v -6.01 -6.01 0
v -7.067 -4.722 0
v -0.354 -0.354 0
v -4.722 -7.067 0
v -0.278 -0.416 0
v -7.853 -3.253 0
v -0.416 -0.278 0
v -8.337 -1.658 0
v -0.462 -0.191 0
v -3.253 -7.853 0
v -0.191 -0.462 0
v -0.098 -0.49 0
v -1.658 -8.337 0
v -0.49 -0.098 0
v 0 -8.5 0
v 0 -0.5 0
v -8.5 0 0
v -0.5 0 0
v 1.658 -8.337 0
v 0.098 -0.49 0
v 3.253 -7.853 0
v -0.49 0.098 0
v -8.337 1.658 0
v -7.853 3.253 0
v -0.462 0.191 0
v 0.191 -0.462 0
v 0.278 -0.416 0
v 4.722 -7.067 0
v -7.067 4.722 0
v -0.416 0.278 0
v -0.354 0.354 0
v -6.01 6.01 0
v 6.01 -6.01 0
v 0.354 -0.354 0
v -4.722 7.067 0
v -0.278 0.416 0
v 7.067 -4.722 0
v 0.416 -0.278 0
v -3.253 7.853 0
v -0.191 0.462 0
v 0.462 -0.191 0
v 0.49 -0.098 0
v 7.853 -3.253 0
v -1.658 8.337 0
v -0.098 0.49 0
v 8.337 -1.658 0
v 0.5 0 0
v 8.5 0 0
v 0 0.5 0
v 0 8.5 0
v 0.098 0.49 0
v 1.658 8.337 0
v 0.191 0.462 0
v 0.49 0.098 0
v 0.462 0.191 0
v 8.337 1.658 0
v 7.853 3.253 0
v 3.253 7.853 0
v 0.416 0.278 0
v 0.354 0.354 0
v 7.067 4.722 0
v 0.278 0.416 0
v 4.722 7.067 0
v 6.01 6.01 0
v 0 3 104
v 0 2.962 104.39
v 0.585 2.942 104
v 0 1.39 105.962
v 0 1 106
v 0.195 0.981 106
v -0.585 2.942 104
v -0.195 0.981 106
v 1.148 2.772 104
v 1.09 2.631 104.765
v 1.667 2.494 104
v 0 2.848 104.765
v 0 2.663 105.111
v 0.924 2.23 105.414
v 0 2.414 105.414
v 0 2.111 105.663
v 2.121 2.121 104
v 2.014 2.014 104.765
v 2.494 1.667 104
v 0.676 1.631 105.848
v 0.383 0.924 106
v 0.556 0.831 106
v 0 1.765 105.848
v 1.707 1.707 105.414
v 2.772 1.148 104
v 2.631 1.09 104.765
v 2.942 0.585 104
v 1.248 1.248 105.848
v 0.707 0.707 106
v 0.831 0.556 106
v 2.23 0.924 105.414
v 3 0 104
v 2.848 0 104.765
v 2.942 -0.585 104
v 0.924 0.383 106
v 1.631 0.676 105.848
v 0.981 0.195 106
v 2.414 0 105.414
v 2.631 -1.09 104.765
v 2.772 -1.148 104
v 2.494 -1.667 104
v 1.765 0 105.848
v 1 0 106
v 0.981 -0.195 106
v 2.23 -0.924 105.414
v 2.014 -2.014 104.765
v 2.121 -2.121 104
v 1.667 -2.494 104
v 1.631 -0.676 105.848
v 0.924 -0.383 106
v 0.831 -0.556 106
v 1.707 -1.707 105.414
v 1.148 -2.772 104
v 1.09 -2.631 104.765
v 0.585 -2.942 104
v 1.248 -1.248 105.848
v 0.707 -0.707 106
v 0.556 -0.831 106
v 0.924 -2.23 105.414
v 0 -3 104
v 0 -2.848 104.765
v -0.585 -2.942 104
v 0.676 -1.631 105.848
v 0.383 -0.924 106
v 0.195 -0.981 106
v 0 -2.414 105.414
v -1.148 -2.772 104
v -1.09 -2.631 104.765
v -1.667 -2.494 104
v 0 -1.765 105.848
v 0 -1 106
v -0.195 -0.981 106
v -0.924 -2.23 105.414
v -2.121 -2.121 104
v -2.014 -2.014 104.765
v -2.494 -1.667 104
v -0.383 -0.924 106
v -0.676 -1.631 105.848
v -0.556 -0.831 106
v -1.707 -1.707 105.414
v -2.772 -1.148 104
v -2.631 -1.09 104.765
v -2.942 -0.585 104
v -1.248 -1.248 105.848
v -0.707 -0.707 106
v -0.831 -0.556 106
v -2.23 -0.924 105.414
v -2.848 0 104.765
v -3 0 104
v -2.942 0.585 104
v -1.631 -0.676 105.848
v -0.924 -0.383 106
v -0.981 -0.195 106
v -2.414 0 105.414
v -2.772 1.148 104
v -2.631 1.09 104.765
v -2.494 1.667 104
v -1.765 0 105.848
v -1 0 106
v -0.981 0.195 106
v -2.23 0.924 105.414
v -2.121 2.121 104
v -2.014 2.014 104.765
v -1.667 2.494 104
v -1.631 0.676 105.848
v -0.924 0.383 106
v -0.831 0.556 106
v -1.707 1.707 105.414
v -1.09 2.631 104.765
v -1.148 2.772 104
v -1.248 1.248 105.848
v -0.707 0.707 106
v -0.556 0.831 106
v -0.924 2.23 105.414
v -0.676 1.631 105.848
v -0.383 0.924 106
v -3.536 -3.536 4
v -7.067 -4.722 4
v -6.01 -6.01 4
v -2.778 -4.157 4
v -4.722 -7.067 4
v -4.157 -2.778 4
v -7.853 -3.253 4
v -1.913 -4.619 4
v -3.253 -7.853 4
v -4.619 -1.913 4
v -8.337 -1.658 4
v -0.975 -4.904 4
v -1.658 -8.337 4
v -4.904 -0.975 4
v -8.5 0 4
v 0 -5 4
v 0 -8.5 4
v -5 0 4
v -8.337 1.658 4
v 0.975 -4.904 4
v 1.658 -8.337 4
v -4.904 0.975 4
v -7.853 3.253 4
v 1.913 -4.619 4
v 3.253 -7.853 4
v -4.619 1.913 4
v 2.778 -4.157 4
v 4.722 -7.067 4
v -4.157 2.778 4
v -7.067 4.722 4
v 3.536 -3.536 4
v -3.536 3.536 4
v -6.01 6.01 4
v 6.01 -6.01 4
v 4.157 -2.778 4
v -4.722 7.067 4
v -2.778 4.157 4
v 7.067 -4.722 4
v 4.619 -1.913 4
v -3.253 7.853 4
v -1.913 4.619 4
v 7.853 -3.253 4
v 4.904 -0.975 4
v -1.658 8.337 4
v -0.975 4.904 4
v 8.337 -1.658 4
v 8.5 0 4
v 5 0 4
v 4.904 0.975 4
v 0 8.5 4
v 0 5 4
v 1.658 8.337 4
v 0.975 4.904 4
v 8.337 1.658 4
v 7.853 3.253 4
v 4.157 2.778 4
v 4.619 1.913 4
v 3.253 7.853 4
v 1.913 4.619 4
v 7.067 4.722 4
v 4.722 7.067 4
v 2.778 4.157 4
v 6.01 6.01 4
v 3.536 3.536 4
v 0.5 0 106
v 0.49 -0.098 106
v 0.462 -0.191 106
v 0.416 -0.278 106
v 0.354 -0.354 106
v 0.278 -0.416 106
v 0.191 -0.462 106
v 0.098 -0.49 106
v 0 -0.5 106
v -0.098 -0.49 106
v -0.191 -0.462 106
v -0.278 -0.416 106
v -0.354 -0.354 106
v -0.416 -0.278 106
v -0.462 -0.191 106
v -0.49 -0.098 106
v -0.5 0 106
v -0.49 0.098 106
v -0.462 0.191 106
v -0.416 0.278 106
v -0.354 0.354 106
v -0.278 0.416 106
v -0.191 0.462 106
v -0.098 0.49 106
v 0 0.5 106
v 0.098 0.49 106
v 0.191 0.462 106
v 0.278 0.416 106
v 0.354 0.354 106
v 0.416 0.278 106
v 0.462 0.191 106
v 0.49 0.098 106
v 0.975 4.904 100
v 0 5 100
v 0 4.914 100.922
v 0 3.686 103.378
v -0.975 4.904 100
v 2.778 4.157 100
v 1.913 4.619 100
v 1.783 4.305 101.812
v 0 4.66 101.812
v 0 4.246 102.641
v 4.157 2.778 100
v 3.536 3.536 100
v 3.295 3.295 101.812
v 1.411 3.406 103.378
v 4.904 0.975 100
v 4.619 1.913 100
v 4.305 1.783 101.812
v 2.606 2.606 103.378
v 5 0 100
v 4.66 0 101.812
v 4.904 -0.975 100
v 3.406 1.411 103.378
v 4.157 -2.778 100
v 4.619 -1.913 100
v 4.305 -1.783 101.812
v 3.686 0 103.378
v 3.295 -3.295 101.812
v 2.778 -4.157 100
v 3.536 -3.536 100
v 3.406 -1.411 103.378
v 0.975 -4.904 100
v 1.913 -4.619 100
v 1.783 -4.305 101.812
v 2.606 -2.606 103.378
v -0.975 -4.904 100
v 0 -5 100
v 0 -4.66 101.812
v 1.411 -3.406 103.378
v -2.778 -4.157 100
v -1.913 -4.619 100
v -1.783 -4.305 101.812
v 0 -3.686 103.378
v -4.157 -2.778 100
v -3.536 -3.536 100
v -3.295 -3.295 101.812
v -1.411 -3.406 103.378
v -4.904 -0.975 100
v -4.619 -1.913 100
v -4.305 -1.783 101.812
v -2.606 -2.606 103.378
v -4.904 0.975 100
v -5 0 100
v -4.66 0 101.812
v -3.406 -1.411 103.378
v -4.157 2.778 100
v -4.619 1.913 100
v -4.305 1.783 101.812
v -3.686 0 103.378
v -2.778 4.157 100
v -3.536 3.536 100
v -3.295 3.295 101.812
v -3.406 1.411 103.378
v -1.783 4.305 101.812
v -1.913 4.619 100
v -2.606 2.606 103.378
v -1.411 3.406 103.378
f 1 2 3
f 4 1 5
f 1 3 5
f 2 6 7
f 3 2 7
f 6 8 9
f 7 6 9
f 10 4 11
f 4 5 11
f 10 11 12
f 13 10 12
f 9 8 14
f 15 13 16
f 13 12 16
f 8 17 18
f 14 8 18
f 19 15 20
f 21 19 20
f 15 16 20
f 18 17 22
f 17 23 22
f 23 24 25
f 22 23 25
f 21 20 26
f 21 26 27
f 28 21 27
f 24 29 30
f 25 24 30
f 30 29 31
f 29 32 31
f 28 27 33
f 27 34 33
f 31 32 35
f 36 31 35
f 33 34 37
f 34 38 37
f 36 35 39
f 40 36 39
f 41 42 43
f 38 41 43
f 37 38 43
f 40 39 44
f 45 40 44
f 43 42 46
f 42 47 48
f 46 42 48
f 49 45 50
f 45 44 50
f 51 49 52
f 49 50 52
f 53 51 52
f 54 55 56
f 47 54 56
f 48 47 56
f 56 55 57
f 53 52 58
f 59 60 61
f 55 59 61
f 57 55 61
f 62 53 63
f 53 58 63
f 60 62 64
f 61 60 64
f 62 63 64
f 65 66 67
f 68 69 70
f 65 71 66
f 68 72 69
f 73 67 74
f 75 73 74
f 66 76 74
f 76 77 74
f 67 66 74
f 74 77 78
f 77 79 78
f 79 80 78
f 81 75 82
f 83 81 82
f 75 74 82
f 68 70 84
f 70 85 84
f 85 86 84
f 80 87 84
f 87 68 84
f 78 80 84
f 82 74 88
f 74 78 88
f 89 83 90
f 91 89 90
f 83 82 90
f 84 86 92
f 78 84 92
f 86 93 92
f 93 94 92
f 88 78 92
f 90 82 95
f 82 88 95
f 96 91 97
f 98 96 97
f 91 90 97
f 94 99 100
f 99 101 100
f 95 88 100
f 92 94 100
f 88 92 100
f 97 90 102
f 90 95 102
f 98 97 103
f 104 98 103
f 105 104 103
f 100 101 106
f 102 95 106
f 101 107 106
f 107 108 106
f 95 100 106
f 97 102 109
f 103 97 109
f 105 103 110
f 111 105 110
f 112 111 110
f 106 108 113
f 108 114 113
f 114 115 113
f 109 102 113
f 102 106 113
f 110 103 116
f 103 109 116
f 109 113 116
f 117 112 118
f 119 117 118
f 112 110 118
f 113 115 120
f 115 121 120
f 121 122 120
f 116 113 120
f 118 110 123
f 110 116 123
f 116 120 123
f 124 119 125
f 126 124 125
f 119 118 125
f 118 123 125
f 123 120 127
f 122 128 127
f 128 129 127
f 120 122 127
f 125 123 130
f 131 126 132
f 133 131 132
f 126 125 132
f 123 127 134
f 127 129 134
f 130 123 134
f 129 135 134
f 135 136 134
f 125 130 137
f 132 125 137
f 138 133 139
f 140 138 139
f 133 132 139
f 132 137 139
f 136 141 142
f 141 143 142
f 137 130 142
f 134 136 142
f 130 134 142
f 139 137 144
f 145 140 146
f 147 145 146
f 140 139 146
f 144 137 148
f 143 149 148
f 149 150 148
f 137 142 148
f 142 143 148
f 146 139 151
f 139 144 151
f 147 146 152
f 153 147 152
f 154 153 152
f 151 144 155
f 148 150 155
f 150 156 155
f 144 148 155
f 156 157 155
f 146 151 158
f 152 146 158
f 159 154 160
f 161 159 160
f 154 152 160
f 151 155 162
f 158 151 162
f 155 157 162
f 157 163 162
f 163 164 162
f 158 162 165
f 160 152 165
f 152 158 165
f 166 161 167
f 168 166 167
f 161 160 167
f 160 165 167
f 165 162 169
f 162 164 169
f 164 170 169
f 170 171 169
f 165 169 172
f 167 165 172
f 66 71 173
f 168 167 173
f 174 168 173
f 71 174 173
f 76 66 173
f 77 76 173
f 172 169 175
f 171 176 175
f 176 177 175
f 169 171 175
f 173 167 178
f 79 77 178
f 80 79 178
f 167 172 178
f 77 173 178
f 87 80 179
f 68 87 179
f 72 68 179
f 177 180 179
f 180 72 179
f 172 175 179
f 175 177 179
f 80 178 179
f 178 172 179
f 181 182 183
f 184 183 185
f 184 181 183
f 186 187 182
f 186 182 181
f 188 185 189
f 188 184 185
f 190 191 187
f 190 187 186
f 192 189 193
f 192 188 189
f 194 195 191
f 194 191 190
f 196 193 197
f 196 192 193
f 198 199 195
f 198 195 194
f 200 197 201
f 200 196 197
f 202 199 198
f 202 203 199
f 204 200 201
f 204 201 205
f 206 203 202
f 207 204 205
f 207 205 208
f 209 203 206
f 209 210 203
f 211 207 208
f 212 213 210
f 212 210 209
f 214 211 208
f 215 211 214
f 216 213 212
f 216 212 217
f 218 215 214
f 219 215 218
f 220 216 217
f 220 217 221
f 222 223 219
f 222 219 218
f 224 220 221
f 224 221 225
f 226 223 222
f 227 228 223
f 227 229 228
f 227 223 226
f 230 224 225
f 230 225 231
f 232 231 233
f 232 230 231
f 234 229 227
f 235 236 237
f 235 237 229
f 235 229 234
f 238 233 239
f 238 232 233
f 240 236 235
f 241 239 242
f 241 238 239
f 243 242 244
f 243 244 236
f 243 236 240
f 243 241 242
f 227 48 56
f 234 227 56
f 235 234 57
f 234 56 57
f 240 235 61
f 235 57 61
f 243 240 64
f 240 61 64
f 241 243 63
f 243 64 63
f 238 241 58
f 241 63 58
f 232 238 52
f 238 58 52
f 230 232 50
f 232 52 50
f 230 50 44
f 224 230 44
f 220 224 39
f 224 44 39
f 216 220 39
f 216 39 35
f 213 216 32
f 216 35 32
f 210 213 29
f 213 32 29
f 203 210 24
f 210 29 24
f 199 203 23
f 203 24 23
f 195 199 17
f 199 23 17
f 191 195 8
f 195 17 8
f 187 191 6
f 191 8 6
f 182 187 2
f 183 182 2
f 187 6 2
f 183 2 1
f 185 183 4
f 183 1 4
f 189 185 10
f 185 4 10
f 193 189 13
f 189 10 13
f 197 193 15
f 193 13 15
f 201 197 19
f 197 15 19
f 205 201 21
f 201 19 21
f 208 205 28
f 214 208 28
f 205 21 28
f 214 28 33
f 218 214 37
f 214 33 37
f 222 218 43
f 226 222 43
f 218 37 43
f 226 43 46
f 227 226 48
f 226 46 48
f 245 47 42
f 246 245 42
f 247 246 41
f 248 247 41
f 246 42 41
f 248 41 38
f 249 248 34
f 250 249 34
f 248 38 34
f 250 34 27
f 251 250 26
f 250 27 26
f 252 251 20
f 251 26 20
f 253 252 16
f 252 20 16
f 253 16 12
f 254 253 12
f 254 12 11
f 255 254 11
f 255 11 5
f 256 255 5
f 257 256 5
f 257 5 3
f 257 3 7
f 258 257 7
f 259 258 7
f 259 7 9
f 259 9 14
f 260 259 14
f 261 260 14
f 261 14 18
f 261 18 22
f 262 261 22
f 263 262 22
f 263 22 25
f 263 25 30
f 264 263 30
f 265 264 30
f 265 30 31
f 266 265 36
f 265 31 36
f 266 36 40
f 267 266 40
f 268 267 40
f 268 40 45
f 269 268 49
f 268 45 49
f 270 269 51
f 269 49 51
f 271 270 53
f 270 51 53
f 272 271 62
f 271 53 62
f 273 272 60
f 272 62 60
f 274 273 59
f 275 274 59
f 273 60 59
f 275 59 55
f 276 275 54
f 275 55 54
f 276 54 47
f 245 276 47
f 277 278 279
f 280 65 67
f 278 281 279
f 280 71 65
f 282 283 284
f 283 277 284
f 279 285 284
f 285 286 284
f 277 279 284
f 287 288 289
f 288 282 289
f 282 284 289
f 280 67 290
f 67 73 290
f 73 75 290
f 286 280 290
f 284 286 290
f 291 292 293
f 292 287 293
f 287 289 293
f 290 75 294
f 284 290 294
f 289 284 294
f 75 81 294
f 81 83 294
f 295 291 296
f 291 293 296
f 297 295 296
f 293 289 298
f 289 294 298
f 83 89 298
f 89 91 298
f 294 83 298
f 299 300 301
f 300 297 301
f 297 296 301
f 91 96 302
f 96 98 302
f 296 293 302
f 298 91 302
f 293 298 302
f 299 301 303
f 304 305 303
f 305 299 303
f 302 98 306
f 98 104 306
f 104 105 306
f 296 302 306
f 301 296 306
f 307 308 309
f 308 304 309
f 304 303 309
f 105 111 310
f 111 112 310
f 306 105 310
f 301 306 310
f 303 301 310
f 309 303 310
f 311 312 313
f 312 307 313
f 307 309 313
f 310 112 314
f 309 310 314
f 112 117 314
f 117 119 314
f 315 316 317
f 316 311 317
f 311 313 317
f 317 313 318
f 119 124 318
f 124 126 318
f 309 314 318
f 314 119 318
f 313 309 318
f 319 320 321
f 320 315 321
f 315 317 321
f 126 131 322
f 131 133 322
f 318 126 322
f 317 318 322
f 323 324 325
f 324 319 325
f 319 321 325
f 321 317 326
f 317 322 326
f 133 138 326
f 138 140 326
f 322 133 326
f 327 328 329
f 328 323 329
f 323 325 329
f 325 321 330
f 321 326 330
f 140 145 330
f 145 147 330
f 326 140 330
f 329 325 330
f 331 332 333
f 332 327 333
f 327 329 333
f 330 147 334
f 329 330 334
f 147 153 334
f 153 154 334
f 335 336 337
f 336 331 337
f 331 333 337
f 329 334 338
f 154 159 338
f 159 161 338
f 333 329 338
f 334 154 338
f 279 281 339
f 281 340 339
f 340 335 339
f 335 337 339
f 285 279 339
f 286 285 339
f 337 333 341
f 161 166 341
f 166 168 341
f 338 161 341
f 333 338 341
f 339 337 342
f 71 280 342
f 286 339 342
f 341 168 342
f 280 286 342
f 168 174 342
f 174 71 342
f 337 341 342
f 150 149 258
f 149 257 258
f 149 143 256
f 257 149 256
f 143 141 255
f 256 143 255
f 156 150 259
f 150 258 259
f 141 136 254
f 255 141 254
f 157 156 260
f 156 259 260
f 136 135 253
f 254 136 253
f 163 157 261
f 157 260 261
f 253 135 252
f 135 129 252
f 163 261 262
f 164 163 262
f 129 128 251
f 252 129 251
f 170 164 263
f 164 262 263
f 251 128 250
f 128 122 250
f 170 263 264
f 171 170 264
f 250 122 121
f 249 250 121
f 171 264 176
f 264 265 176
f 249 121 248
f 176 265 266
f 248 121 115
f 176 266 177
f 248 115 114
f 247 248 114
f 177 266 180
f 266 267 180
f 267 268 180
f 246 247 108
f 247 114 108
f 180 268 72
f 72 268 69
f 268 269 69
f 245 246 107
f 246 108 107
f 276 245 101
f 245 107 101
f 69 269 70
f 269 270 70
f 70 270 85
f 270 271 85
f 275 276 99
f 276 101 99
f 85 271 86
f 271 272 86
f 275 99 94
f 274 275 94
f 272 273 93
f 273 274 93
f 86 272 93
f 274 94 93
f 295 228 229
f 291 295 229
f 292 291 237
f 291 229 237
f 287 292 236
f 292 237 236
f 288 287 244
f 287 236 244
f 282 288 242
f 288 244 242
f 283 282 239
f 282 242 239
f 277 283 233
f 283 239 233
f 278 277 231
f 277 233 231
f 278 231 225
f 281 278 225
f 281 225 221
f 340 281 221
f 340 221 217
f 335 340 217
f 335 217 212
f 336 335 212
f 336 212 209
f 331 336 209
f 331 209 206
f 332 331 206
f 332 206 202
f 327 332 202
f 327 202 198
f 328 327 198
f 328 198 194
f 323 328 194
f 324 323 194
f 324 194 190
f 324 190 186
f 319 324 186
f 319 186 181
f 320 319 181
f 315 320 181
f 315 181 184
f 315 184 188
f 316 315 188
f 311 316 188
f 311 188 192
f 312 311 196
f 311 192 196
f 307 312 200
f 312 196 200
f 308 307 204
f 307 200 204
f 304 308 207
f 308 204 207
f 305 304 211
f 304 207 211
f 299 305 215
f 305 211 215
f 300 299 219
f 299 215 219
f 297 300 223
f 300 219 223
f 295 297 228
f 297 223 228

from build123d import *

# Parameters (mm, degrees)
F0_R     = 8.5
F1_DEPTH = 4
F2_R     = 5
F3_DEPTH = 100
F6_R     = 0.5
F7_DEPTH = 169.1


with BuildPart() as f1:
    # F0 (on Top) → F1 (new body)
    with BuildSketch(Plane.XY):
        Circle(F0_R)
    extrude(amount=F1_DEPTH)

    # F2 (on Top) → F3 (join)
    with BuildSketch(Plane.XY):
        Circle(F2_R)
    extrude(amount=F3_DEPTH)

    # F4 (on Right) → F5 (revolve)
    with BuildSketch(Plane.YZ):
        with BuildLine():
            Line((0, 104), (0, 100))
            Line((0, 100), (5, 100))
            ThreePointArc((5, 100), (4.472136, 102.236068), (3, 104))
            Line((3, 104), (0, 104))
        make_face()
        with BuildLine():
            ThreePointArc((0, 105), (1.581139, 104.743416), (3, 104))
            ThreePointArc((3, 104), (2.414214, 105.414214), (1, 106))
            Line((1, 106), (0, 106))
            Line((0, 106), (0, 105))
        make_face()
        with BuildLine():
            Line((0, 105), (0, 104))
            Line((0, 104), (3, 104))
            ThreePointArc((3, 104), (1.581139, 104.743416), (0, 105))
        make_face()
    revolve(axis=Axis((0, 0, 103), (0, 0, -1)))

    # F6 (on face) → F7 (cut)
    with BuildSketch(Plane(origin=(0, 0, 0), x_dir=(1, 0, 0), z_dir=(0, 0, -1))):
        Circle(F6_R)
    extrude(amount=-F7_DEPTH, mode=Mode.SUBTRACT)


solid = f1.part
